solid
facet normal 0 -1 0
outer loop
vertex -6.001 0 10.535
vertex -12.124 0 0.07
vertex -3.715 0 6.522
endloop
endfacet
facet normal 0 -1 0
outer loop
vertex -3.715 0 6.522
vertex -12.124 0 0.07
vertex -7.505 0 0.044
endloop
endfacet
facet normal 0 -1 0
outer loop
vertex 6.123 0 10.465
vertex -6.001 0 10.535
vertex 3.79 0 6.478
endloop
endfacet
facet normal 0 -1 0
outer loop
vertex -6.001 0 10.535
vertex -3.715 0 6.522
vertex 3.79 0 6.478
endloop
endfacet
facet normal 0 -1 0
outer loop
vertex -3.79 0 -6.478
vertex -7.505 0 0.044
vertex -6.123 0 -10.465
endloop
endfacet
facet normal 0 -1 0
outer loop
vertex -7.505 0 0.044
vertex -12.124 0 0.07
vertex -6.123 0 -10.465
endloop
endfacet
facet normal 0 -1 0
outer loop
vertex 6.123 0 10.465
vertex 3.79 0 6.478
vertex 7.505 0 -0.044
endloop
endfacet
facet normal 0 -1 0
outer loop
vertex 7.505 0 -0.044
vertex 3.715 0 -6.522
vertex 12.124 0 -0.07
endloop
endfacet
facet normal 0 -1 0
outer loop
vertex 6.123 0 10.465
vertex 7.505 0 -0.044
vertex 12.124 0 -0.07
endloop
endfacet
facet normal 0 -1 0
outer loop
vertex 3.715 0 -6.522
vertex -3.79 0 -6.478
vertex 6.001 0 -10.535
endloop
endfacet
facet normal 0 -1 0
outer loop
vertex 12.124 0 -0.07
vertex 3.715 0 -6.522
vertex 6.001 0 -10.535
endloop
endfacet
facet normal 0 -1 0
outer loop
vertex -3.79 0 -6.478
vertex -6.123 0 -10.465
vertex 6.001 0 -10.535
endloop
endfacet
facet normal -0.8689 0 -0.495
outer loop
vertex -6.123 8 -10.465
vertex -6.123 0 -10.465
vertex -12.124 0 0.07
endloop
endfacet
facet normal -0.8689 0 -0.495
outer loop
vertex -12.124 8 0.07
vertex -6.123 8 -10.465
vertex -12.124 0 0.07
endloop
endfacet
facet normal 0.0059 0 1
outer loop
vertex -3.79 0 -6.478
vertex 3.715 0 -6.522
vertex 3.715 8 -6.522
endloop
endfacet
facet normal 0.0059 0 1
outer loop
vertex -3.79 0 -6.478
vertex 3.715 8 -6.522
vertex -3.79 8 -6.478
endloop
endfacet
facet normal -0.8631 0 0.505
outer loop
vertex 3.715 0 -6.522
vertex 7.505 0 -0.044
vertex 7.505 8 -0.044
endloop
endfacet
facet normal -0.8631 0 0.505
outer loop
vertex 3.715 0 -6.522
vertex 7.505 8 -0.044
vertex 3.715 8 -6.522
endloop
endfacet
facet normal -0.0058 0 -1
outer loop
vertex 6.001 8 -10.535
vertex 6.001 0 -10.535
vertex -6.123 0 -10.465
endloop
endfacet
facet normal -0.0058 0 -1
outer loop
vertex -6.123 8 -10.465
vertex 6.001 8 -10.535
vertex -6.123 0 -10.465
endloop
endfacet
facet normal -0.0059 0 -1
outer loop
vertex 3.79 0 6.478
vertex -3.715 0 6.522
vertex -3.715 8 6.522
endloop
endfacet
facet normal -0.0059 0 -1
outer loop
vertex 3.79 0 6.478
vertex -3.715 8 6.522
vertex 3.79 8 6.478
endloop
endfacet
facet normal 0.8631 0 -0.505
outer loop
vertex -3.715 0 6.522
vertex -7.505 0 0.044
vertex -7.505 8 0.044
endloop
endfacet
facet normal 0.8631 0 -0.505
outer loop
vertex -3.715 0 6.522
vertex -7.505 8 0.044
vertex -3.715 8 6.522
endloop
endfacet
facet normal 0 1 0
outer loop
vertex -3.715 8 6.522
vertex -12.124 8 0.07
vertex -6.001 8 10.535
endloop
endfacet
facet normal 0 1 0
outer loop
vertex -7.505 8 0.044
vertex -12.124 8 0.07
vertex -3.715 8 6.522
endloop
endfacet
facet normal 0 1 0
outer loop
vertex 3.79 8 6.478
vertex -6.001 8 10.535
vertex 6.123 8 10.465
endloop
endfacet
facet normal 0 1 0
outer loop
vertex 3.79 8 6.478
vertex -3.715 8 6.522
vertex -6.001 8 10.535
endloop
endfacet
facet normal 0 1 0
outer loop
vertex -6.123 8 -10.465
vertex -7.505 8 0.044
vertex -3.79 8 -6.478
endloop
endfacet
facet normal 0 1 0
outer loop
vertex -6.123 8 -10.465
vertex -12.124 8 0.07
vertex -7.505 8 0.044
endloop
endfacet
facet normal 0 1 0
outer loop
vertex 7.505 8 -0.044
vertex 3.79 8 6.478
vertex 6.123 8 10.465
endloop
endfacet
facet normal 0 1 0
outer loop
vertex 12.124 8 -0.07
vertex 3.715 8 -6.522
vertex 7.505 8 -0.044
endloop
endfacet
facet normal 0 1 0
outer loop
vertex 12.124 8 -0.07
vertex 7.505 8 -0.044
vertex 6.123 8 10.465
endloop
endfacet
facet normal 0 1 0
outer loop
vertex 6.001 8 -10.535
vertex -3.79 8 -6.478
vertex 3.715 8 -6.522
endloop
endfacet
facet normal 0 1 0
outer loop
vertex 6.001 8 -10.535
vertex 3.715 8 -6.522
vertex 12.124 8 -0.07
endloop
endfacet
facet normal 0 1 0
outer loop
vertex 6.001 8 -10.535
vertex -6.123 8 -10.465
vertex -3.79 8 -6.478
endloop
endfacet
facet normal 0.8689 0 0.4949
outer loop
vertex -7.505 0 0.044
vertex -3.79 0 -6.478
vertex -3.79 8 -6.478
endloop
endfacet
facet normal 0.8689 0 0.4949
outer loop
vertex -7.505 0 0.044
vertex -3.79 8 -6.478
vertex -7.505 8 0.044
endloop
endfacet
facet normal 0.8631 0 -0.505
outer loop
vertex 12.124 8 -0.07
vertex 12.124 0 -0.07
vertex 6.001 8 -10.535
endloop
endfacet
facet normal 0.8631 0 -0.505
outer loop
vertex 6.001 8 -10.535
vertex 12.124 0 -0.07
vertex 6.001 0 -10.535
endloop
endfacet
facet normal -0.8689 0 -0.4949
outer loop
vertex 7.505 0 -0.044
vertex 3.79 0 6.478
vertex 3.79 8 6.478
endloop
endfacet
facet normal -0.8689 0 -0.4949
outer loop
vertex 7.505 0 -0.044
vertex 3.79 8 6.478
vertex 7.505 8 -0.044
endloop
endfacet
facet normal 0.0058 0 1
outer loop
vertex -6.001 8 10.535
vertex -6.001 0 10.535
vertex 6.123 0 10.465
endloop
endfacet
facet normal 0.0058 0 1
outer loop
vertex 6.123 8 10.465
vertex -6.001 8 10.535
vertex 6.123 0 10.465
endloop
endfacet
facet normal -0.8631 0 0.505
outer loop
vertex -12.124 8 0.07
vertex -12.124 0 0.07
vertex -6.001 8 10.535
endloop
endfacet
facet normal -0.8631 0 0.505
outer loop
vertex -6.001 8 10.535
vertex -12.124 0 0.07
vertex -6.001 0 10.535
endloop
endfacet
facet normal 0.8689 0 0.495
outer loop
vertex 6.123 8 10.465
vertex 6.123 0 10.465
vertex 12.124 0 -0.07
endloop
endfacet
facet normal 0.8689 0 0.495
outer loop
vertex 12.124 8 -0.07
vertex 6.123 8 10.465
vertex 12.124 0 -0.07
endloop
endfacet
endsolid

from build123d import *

# Parameters (mm, degrees)
SALIENTE_EXTRUIR1_DEPTH = 8


with BuildPart() as part:
    # Croquis1 → Saliente-Extruir1 (new body)
    with BuildSketch(Plane(origin=(0, 0, 0), x_dir=(1, 0, 0), z_dir=(0, 1, 0))):
        Polygon((12.124151894, 0.070291154), (6.001202022, 10.534969117), (-6.122949872, 10.464677963), (-12.124151894, -0.070291154), (-6.001202022, -10.534969117), (6.122949872, -10.464677963), align=None)
        Polygon((3.79039754, -6.478133977), (7.505427363, 0.043513571), (3.715029823, 6.521647548), (-3.79039754, 6.478133977), (-7.505427363, -0.043513571), (-3.715029823, -6.521647548), align=None, mode=Mode.SUBTRACT)
    extrude(amount=SALIENTE_EXTRUIR1_DEPTH)


solid = part.part
